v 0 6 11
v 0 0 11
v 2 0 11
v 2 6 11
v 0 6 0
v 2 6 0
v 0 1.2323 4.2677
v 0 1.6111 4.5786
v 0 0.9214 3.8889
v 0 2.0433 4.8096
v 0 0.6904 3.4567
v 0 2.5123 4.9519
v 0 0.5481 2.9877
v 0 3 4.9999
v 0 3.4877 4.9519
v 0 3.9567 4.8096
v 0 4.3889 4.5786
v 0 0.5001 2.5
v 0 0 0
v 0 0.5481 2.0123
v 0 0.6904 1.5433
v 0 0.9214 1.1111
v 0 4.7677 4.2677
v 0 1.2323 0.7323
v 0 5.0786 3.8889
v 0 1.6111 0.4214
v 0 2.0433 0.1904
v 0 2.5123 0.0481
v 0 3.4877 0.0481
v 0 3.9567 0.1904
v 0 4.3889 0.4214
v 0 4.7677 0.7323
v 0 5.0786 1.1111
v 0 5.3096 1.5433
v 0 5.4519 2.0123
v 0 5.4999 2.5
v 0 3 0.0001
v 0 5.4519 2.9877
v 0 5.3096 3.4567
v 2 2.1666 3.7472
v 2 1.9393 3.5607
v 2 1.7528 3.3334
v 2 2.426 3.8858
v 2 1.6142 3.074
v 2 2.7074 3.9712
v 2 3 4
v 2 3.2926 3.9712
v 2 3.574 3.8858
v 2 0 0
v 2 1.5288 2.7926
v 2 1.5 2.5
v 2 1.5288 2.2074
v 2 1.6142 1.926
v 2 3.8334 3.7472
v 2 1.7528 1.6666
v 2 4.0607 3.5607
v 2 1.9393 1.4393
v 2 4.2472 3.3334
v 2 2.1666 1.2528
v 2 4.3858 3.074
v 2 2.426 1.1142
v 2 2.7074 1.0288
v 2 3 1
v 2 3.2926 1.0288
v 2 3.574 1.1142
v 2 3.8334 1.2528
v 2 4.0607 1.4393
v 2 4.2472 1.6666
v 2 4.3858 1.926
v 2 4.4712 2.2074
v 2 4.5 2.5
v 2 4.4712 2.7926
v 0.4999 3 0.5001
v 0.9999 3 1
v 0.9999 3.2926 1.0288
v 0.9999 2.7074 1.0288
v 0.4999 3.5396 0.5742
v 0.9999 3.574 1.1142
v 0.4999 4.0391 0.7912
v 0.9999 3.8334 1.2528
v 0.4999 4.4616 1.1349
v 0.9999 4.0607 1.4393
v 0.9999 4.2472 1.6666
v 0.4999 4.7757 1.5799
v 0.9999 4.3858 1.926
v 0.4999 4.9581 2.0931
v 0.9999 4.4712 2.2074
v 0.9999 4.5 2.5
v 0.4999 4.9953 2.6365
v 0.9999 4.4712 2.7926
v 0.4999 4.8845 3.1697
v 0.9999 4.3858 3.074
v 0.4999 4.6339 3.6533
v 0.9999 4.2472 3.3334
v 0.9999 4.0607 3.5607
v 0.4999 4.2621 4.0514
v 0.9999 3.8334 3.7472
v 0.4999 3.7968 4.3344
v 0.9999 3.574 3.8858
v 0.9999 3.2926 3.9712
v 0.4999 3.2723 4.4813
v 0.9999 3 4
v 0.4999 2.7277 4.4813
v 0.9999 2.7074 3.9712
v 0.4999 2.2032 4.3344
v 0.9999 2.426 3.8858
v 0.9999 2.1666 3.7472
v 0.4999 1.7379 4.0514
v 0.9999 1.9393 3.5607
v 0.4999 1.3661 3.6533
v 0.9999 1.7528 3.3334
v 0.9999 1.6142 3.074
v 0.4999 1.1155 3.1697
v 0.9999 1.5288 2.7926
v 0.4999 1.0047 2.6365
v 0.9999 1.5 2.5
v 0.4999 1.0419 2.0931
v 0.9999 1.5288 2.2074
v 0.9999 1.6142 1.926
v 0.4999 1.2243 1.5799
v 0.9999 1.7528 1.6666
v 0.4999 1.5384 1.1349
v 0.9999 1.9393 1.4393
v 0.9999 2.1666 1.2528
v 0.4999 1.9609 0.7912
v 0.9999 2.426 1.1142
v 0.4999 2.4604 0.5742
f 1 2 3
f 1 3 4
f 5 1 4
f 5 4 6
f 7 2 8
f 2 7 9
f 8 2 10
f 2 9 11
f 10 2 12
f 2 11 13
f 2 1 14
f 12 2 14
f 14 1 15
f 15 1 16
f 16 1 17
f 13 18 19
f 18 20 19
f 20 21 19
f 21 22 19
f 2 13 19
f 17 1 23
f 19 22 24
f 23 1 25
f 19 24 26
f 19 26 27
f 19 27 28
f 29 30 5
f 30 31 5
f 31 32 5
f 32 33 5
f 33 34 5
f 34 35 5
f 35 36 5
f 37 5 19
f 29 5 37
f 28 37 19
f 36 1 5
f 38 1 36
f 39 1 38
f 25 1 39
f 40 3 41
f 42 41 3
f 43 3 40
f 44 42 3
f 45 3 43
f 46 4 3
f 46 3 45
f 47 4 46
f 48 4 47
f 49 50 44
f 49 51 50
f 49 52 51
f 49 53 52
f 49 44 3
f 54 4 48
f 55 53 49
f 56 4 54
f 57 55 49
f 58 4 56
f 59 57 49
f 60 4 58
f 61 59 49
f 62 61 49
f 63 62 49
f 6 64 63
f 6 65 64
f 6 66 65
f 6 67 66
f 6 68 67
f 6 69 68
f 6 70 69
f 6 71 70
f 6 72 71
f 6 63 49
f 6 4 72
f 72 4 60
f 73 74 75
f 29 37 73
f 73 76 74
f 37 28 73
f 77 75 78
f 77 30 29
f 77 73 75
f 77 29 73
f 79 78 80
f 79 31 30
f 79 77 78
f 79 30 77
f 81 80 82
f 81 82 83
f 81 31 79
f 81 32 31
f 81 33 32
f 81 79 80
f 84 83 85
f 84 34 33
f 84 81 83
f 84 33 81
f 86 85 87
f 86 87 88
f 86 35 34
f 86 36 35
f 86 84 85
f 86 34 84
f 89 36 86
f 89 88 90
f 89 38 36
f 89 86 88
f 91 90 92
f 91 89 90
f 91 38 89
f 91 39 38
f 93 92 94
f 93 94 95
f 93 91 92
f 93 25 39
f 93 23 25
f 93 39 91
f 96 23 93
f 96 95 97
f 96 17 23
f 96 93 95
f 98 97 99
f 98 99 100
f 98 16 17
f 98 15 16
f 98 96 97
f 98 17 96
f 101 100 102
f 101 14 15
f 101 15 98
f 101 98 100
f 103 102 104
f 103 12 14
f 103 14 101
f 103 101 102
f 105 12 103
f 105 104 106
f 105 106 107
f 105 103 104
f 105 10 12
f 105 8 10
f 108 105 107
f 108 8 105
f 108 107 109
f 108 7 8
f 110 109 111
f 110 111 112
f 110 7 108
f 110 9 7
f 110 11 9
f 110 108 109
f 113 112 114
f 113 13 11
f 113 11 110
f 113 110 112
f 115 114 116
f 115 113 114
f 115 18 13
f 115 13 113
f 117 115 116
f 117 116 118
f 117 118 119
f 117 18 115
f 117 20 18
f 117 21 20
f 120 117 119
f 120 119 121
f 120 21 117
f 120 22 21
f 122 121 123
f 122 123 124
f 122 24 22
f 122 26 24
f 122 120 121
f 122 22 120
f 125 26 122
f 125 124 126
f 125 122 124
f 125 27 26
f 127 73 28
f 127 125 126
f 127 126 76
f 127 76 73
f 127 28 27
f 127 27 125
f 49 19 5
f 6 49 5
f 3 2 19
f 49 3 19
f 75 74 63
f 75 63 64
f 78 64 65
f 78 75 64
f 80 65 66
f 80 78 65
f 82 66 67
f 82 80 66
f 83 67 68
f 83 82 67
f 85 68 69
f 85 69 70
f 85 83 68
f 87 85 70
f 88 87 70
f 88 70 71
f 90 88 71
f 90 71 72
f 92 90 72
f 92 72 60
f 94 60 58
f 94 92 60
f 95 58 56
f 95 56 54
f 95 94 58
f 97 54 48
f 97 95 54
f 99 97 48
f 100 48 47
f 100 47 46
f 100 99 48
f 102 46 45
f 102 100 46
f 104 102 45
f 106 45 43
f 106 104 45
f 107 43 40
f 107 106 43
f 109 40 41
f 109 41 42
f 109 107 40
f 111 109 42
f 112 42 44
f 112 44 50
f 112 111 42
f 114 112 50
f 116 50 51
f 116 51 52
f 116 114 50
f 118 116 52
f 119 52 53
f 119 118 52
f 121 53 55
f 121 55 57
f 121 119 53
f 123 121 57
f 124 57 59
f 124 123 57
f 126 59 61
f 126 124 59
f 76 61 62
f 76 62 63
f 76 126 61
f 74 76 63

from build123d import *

# Parameters (mm, degrees)
SKETCH_1_W      = 11
SKETCH_1_H      = 6
SKETCH_1_R      = 1.5
EXTRUDE_1_DEPTH = 2
CHAMFER_1_SIZE  = 1


with BuildPart() as part:
    # Эскиз1 → Бобышка-Вытянуть1 (new body)
    with BuildSketch(Plane(origin=(0, 0, 0), x_dir=(0, 0, -1), z_dir=(1, 0, 0))):
        with Locations((-5.5, 3)):
            Rectangle(SKETCH_1_W, SKETCH_1_H)
        with Locations((-2.5, 3)):
            Circle(SKETCH_1_R, mode=Mode.SUBTRACT)
    extrude(amount=EXTRUDE_1_DEPTH)

    # Фаска1
    chamfer_1_edges = [part.edges().sort_by_distance(p)[0] for p in [
        (0, 3, 4),
    ]]
    chamfer(chamfer_1_edges, length=CHAMFER_1_SIZE - 0.0001)  # a hair under: the kernel refuses the full size


solid = part.part
